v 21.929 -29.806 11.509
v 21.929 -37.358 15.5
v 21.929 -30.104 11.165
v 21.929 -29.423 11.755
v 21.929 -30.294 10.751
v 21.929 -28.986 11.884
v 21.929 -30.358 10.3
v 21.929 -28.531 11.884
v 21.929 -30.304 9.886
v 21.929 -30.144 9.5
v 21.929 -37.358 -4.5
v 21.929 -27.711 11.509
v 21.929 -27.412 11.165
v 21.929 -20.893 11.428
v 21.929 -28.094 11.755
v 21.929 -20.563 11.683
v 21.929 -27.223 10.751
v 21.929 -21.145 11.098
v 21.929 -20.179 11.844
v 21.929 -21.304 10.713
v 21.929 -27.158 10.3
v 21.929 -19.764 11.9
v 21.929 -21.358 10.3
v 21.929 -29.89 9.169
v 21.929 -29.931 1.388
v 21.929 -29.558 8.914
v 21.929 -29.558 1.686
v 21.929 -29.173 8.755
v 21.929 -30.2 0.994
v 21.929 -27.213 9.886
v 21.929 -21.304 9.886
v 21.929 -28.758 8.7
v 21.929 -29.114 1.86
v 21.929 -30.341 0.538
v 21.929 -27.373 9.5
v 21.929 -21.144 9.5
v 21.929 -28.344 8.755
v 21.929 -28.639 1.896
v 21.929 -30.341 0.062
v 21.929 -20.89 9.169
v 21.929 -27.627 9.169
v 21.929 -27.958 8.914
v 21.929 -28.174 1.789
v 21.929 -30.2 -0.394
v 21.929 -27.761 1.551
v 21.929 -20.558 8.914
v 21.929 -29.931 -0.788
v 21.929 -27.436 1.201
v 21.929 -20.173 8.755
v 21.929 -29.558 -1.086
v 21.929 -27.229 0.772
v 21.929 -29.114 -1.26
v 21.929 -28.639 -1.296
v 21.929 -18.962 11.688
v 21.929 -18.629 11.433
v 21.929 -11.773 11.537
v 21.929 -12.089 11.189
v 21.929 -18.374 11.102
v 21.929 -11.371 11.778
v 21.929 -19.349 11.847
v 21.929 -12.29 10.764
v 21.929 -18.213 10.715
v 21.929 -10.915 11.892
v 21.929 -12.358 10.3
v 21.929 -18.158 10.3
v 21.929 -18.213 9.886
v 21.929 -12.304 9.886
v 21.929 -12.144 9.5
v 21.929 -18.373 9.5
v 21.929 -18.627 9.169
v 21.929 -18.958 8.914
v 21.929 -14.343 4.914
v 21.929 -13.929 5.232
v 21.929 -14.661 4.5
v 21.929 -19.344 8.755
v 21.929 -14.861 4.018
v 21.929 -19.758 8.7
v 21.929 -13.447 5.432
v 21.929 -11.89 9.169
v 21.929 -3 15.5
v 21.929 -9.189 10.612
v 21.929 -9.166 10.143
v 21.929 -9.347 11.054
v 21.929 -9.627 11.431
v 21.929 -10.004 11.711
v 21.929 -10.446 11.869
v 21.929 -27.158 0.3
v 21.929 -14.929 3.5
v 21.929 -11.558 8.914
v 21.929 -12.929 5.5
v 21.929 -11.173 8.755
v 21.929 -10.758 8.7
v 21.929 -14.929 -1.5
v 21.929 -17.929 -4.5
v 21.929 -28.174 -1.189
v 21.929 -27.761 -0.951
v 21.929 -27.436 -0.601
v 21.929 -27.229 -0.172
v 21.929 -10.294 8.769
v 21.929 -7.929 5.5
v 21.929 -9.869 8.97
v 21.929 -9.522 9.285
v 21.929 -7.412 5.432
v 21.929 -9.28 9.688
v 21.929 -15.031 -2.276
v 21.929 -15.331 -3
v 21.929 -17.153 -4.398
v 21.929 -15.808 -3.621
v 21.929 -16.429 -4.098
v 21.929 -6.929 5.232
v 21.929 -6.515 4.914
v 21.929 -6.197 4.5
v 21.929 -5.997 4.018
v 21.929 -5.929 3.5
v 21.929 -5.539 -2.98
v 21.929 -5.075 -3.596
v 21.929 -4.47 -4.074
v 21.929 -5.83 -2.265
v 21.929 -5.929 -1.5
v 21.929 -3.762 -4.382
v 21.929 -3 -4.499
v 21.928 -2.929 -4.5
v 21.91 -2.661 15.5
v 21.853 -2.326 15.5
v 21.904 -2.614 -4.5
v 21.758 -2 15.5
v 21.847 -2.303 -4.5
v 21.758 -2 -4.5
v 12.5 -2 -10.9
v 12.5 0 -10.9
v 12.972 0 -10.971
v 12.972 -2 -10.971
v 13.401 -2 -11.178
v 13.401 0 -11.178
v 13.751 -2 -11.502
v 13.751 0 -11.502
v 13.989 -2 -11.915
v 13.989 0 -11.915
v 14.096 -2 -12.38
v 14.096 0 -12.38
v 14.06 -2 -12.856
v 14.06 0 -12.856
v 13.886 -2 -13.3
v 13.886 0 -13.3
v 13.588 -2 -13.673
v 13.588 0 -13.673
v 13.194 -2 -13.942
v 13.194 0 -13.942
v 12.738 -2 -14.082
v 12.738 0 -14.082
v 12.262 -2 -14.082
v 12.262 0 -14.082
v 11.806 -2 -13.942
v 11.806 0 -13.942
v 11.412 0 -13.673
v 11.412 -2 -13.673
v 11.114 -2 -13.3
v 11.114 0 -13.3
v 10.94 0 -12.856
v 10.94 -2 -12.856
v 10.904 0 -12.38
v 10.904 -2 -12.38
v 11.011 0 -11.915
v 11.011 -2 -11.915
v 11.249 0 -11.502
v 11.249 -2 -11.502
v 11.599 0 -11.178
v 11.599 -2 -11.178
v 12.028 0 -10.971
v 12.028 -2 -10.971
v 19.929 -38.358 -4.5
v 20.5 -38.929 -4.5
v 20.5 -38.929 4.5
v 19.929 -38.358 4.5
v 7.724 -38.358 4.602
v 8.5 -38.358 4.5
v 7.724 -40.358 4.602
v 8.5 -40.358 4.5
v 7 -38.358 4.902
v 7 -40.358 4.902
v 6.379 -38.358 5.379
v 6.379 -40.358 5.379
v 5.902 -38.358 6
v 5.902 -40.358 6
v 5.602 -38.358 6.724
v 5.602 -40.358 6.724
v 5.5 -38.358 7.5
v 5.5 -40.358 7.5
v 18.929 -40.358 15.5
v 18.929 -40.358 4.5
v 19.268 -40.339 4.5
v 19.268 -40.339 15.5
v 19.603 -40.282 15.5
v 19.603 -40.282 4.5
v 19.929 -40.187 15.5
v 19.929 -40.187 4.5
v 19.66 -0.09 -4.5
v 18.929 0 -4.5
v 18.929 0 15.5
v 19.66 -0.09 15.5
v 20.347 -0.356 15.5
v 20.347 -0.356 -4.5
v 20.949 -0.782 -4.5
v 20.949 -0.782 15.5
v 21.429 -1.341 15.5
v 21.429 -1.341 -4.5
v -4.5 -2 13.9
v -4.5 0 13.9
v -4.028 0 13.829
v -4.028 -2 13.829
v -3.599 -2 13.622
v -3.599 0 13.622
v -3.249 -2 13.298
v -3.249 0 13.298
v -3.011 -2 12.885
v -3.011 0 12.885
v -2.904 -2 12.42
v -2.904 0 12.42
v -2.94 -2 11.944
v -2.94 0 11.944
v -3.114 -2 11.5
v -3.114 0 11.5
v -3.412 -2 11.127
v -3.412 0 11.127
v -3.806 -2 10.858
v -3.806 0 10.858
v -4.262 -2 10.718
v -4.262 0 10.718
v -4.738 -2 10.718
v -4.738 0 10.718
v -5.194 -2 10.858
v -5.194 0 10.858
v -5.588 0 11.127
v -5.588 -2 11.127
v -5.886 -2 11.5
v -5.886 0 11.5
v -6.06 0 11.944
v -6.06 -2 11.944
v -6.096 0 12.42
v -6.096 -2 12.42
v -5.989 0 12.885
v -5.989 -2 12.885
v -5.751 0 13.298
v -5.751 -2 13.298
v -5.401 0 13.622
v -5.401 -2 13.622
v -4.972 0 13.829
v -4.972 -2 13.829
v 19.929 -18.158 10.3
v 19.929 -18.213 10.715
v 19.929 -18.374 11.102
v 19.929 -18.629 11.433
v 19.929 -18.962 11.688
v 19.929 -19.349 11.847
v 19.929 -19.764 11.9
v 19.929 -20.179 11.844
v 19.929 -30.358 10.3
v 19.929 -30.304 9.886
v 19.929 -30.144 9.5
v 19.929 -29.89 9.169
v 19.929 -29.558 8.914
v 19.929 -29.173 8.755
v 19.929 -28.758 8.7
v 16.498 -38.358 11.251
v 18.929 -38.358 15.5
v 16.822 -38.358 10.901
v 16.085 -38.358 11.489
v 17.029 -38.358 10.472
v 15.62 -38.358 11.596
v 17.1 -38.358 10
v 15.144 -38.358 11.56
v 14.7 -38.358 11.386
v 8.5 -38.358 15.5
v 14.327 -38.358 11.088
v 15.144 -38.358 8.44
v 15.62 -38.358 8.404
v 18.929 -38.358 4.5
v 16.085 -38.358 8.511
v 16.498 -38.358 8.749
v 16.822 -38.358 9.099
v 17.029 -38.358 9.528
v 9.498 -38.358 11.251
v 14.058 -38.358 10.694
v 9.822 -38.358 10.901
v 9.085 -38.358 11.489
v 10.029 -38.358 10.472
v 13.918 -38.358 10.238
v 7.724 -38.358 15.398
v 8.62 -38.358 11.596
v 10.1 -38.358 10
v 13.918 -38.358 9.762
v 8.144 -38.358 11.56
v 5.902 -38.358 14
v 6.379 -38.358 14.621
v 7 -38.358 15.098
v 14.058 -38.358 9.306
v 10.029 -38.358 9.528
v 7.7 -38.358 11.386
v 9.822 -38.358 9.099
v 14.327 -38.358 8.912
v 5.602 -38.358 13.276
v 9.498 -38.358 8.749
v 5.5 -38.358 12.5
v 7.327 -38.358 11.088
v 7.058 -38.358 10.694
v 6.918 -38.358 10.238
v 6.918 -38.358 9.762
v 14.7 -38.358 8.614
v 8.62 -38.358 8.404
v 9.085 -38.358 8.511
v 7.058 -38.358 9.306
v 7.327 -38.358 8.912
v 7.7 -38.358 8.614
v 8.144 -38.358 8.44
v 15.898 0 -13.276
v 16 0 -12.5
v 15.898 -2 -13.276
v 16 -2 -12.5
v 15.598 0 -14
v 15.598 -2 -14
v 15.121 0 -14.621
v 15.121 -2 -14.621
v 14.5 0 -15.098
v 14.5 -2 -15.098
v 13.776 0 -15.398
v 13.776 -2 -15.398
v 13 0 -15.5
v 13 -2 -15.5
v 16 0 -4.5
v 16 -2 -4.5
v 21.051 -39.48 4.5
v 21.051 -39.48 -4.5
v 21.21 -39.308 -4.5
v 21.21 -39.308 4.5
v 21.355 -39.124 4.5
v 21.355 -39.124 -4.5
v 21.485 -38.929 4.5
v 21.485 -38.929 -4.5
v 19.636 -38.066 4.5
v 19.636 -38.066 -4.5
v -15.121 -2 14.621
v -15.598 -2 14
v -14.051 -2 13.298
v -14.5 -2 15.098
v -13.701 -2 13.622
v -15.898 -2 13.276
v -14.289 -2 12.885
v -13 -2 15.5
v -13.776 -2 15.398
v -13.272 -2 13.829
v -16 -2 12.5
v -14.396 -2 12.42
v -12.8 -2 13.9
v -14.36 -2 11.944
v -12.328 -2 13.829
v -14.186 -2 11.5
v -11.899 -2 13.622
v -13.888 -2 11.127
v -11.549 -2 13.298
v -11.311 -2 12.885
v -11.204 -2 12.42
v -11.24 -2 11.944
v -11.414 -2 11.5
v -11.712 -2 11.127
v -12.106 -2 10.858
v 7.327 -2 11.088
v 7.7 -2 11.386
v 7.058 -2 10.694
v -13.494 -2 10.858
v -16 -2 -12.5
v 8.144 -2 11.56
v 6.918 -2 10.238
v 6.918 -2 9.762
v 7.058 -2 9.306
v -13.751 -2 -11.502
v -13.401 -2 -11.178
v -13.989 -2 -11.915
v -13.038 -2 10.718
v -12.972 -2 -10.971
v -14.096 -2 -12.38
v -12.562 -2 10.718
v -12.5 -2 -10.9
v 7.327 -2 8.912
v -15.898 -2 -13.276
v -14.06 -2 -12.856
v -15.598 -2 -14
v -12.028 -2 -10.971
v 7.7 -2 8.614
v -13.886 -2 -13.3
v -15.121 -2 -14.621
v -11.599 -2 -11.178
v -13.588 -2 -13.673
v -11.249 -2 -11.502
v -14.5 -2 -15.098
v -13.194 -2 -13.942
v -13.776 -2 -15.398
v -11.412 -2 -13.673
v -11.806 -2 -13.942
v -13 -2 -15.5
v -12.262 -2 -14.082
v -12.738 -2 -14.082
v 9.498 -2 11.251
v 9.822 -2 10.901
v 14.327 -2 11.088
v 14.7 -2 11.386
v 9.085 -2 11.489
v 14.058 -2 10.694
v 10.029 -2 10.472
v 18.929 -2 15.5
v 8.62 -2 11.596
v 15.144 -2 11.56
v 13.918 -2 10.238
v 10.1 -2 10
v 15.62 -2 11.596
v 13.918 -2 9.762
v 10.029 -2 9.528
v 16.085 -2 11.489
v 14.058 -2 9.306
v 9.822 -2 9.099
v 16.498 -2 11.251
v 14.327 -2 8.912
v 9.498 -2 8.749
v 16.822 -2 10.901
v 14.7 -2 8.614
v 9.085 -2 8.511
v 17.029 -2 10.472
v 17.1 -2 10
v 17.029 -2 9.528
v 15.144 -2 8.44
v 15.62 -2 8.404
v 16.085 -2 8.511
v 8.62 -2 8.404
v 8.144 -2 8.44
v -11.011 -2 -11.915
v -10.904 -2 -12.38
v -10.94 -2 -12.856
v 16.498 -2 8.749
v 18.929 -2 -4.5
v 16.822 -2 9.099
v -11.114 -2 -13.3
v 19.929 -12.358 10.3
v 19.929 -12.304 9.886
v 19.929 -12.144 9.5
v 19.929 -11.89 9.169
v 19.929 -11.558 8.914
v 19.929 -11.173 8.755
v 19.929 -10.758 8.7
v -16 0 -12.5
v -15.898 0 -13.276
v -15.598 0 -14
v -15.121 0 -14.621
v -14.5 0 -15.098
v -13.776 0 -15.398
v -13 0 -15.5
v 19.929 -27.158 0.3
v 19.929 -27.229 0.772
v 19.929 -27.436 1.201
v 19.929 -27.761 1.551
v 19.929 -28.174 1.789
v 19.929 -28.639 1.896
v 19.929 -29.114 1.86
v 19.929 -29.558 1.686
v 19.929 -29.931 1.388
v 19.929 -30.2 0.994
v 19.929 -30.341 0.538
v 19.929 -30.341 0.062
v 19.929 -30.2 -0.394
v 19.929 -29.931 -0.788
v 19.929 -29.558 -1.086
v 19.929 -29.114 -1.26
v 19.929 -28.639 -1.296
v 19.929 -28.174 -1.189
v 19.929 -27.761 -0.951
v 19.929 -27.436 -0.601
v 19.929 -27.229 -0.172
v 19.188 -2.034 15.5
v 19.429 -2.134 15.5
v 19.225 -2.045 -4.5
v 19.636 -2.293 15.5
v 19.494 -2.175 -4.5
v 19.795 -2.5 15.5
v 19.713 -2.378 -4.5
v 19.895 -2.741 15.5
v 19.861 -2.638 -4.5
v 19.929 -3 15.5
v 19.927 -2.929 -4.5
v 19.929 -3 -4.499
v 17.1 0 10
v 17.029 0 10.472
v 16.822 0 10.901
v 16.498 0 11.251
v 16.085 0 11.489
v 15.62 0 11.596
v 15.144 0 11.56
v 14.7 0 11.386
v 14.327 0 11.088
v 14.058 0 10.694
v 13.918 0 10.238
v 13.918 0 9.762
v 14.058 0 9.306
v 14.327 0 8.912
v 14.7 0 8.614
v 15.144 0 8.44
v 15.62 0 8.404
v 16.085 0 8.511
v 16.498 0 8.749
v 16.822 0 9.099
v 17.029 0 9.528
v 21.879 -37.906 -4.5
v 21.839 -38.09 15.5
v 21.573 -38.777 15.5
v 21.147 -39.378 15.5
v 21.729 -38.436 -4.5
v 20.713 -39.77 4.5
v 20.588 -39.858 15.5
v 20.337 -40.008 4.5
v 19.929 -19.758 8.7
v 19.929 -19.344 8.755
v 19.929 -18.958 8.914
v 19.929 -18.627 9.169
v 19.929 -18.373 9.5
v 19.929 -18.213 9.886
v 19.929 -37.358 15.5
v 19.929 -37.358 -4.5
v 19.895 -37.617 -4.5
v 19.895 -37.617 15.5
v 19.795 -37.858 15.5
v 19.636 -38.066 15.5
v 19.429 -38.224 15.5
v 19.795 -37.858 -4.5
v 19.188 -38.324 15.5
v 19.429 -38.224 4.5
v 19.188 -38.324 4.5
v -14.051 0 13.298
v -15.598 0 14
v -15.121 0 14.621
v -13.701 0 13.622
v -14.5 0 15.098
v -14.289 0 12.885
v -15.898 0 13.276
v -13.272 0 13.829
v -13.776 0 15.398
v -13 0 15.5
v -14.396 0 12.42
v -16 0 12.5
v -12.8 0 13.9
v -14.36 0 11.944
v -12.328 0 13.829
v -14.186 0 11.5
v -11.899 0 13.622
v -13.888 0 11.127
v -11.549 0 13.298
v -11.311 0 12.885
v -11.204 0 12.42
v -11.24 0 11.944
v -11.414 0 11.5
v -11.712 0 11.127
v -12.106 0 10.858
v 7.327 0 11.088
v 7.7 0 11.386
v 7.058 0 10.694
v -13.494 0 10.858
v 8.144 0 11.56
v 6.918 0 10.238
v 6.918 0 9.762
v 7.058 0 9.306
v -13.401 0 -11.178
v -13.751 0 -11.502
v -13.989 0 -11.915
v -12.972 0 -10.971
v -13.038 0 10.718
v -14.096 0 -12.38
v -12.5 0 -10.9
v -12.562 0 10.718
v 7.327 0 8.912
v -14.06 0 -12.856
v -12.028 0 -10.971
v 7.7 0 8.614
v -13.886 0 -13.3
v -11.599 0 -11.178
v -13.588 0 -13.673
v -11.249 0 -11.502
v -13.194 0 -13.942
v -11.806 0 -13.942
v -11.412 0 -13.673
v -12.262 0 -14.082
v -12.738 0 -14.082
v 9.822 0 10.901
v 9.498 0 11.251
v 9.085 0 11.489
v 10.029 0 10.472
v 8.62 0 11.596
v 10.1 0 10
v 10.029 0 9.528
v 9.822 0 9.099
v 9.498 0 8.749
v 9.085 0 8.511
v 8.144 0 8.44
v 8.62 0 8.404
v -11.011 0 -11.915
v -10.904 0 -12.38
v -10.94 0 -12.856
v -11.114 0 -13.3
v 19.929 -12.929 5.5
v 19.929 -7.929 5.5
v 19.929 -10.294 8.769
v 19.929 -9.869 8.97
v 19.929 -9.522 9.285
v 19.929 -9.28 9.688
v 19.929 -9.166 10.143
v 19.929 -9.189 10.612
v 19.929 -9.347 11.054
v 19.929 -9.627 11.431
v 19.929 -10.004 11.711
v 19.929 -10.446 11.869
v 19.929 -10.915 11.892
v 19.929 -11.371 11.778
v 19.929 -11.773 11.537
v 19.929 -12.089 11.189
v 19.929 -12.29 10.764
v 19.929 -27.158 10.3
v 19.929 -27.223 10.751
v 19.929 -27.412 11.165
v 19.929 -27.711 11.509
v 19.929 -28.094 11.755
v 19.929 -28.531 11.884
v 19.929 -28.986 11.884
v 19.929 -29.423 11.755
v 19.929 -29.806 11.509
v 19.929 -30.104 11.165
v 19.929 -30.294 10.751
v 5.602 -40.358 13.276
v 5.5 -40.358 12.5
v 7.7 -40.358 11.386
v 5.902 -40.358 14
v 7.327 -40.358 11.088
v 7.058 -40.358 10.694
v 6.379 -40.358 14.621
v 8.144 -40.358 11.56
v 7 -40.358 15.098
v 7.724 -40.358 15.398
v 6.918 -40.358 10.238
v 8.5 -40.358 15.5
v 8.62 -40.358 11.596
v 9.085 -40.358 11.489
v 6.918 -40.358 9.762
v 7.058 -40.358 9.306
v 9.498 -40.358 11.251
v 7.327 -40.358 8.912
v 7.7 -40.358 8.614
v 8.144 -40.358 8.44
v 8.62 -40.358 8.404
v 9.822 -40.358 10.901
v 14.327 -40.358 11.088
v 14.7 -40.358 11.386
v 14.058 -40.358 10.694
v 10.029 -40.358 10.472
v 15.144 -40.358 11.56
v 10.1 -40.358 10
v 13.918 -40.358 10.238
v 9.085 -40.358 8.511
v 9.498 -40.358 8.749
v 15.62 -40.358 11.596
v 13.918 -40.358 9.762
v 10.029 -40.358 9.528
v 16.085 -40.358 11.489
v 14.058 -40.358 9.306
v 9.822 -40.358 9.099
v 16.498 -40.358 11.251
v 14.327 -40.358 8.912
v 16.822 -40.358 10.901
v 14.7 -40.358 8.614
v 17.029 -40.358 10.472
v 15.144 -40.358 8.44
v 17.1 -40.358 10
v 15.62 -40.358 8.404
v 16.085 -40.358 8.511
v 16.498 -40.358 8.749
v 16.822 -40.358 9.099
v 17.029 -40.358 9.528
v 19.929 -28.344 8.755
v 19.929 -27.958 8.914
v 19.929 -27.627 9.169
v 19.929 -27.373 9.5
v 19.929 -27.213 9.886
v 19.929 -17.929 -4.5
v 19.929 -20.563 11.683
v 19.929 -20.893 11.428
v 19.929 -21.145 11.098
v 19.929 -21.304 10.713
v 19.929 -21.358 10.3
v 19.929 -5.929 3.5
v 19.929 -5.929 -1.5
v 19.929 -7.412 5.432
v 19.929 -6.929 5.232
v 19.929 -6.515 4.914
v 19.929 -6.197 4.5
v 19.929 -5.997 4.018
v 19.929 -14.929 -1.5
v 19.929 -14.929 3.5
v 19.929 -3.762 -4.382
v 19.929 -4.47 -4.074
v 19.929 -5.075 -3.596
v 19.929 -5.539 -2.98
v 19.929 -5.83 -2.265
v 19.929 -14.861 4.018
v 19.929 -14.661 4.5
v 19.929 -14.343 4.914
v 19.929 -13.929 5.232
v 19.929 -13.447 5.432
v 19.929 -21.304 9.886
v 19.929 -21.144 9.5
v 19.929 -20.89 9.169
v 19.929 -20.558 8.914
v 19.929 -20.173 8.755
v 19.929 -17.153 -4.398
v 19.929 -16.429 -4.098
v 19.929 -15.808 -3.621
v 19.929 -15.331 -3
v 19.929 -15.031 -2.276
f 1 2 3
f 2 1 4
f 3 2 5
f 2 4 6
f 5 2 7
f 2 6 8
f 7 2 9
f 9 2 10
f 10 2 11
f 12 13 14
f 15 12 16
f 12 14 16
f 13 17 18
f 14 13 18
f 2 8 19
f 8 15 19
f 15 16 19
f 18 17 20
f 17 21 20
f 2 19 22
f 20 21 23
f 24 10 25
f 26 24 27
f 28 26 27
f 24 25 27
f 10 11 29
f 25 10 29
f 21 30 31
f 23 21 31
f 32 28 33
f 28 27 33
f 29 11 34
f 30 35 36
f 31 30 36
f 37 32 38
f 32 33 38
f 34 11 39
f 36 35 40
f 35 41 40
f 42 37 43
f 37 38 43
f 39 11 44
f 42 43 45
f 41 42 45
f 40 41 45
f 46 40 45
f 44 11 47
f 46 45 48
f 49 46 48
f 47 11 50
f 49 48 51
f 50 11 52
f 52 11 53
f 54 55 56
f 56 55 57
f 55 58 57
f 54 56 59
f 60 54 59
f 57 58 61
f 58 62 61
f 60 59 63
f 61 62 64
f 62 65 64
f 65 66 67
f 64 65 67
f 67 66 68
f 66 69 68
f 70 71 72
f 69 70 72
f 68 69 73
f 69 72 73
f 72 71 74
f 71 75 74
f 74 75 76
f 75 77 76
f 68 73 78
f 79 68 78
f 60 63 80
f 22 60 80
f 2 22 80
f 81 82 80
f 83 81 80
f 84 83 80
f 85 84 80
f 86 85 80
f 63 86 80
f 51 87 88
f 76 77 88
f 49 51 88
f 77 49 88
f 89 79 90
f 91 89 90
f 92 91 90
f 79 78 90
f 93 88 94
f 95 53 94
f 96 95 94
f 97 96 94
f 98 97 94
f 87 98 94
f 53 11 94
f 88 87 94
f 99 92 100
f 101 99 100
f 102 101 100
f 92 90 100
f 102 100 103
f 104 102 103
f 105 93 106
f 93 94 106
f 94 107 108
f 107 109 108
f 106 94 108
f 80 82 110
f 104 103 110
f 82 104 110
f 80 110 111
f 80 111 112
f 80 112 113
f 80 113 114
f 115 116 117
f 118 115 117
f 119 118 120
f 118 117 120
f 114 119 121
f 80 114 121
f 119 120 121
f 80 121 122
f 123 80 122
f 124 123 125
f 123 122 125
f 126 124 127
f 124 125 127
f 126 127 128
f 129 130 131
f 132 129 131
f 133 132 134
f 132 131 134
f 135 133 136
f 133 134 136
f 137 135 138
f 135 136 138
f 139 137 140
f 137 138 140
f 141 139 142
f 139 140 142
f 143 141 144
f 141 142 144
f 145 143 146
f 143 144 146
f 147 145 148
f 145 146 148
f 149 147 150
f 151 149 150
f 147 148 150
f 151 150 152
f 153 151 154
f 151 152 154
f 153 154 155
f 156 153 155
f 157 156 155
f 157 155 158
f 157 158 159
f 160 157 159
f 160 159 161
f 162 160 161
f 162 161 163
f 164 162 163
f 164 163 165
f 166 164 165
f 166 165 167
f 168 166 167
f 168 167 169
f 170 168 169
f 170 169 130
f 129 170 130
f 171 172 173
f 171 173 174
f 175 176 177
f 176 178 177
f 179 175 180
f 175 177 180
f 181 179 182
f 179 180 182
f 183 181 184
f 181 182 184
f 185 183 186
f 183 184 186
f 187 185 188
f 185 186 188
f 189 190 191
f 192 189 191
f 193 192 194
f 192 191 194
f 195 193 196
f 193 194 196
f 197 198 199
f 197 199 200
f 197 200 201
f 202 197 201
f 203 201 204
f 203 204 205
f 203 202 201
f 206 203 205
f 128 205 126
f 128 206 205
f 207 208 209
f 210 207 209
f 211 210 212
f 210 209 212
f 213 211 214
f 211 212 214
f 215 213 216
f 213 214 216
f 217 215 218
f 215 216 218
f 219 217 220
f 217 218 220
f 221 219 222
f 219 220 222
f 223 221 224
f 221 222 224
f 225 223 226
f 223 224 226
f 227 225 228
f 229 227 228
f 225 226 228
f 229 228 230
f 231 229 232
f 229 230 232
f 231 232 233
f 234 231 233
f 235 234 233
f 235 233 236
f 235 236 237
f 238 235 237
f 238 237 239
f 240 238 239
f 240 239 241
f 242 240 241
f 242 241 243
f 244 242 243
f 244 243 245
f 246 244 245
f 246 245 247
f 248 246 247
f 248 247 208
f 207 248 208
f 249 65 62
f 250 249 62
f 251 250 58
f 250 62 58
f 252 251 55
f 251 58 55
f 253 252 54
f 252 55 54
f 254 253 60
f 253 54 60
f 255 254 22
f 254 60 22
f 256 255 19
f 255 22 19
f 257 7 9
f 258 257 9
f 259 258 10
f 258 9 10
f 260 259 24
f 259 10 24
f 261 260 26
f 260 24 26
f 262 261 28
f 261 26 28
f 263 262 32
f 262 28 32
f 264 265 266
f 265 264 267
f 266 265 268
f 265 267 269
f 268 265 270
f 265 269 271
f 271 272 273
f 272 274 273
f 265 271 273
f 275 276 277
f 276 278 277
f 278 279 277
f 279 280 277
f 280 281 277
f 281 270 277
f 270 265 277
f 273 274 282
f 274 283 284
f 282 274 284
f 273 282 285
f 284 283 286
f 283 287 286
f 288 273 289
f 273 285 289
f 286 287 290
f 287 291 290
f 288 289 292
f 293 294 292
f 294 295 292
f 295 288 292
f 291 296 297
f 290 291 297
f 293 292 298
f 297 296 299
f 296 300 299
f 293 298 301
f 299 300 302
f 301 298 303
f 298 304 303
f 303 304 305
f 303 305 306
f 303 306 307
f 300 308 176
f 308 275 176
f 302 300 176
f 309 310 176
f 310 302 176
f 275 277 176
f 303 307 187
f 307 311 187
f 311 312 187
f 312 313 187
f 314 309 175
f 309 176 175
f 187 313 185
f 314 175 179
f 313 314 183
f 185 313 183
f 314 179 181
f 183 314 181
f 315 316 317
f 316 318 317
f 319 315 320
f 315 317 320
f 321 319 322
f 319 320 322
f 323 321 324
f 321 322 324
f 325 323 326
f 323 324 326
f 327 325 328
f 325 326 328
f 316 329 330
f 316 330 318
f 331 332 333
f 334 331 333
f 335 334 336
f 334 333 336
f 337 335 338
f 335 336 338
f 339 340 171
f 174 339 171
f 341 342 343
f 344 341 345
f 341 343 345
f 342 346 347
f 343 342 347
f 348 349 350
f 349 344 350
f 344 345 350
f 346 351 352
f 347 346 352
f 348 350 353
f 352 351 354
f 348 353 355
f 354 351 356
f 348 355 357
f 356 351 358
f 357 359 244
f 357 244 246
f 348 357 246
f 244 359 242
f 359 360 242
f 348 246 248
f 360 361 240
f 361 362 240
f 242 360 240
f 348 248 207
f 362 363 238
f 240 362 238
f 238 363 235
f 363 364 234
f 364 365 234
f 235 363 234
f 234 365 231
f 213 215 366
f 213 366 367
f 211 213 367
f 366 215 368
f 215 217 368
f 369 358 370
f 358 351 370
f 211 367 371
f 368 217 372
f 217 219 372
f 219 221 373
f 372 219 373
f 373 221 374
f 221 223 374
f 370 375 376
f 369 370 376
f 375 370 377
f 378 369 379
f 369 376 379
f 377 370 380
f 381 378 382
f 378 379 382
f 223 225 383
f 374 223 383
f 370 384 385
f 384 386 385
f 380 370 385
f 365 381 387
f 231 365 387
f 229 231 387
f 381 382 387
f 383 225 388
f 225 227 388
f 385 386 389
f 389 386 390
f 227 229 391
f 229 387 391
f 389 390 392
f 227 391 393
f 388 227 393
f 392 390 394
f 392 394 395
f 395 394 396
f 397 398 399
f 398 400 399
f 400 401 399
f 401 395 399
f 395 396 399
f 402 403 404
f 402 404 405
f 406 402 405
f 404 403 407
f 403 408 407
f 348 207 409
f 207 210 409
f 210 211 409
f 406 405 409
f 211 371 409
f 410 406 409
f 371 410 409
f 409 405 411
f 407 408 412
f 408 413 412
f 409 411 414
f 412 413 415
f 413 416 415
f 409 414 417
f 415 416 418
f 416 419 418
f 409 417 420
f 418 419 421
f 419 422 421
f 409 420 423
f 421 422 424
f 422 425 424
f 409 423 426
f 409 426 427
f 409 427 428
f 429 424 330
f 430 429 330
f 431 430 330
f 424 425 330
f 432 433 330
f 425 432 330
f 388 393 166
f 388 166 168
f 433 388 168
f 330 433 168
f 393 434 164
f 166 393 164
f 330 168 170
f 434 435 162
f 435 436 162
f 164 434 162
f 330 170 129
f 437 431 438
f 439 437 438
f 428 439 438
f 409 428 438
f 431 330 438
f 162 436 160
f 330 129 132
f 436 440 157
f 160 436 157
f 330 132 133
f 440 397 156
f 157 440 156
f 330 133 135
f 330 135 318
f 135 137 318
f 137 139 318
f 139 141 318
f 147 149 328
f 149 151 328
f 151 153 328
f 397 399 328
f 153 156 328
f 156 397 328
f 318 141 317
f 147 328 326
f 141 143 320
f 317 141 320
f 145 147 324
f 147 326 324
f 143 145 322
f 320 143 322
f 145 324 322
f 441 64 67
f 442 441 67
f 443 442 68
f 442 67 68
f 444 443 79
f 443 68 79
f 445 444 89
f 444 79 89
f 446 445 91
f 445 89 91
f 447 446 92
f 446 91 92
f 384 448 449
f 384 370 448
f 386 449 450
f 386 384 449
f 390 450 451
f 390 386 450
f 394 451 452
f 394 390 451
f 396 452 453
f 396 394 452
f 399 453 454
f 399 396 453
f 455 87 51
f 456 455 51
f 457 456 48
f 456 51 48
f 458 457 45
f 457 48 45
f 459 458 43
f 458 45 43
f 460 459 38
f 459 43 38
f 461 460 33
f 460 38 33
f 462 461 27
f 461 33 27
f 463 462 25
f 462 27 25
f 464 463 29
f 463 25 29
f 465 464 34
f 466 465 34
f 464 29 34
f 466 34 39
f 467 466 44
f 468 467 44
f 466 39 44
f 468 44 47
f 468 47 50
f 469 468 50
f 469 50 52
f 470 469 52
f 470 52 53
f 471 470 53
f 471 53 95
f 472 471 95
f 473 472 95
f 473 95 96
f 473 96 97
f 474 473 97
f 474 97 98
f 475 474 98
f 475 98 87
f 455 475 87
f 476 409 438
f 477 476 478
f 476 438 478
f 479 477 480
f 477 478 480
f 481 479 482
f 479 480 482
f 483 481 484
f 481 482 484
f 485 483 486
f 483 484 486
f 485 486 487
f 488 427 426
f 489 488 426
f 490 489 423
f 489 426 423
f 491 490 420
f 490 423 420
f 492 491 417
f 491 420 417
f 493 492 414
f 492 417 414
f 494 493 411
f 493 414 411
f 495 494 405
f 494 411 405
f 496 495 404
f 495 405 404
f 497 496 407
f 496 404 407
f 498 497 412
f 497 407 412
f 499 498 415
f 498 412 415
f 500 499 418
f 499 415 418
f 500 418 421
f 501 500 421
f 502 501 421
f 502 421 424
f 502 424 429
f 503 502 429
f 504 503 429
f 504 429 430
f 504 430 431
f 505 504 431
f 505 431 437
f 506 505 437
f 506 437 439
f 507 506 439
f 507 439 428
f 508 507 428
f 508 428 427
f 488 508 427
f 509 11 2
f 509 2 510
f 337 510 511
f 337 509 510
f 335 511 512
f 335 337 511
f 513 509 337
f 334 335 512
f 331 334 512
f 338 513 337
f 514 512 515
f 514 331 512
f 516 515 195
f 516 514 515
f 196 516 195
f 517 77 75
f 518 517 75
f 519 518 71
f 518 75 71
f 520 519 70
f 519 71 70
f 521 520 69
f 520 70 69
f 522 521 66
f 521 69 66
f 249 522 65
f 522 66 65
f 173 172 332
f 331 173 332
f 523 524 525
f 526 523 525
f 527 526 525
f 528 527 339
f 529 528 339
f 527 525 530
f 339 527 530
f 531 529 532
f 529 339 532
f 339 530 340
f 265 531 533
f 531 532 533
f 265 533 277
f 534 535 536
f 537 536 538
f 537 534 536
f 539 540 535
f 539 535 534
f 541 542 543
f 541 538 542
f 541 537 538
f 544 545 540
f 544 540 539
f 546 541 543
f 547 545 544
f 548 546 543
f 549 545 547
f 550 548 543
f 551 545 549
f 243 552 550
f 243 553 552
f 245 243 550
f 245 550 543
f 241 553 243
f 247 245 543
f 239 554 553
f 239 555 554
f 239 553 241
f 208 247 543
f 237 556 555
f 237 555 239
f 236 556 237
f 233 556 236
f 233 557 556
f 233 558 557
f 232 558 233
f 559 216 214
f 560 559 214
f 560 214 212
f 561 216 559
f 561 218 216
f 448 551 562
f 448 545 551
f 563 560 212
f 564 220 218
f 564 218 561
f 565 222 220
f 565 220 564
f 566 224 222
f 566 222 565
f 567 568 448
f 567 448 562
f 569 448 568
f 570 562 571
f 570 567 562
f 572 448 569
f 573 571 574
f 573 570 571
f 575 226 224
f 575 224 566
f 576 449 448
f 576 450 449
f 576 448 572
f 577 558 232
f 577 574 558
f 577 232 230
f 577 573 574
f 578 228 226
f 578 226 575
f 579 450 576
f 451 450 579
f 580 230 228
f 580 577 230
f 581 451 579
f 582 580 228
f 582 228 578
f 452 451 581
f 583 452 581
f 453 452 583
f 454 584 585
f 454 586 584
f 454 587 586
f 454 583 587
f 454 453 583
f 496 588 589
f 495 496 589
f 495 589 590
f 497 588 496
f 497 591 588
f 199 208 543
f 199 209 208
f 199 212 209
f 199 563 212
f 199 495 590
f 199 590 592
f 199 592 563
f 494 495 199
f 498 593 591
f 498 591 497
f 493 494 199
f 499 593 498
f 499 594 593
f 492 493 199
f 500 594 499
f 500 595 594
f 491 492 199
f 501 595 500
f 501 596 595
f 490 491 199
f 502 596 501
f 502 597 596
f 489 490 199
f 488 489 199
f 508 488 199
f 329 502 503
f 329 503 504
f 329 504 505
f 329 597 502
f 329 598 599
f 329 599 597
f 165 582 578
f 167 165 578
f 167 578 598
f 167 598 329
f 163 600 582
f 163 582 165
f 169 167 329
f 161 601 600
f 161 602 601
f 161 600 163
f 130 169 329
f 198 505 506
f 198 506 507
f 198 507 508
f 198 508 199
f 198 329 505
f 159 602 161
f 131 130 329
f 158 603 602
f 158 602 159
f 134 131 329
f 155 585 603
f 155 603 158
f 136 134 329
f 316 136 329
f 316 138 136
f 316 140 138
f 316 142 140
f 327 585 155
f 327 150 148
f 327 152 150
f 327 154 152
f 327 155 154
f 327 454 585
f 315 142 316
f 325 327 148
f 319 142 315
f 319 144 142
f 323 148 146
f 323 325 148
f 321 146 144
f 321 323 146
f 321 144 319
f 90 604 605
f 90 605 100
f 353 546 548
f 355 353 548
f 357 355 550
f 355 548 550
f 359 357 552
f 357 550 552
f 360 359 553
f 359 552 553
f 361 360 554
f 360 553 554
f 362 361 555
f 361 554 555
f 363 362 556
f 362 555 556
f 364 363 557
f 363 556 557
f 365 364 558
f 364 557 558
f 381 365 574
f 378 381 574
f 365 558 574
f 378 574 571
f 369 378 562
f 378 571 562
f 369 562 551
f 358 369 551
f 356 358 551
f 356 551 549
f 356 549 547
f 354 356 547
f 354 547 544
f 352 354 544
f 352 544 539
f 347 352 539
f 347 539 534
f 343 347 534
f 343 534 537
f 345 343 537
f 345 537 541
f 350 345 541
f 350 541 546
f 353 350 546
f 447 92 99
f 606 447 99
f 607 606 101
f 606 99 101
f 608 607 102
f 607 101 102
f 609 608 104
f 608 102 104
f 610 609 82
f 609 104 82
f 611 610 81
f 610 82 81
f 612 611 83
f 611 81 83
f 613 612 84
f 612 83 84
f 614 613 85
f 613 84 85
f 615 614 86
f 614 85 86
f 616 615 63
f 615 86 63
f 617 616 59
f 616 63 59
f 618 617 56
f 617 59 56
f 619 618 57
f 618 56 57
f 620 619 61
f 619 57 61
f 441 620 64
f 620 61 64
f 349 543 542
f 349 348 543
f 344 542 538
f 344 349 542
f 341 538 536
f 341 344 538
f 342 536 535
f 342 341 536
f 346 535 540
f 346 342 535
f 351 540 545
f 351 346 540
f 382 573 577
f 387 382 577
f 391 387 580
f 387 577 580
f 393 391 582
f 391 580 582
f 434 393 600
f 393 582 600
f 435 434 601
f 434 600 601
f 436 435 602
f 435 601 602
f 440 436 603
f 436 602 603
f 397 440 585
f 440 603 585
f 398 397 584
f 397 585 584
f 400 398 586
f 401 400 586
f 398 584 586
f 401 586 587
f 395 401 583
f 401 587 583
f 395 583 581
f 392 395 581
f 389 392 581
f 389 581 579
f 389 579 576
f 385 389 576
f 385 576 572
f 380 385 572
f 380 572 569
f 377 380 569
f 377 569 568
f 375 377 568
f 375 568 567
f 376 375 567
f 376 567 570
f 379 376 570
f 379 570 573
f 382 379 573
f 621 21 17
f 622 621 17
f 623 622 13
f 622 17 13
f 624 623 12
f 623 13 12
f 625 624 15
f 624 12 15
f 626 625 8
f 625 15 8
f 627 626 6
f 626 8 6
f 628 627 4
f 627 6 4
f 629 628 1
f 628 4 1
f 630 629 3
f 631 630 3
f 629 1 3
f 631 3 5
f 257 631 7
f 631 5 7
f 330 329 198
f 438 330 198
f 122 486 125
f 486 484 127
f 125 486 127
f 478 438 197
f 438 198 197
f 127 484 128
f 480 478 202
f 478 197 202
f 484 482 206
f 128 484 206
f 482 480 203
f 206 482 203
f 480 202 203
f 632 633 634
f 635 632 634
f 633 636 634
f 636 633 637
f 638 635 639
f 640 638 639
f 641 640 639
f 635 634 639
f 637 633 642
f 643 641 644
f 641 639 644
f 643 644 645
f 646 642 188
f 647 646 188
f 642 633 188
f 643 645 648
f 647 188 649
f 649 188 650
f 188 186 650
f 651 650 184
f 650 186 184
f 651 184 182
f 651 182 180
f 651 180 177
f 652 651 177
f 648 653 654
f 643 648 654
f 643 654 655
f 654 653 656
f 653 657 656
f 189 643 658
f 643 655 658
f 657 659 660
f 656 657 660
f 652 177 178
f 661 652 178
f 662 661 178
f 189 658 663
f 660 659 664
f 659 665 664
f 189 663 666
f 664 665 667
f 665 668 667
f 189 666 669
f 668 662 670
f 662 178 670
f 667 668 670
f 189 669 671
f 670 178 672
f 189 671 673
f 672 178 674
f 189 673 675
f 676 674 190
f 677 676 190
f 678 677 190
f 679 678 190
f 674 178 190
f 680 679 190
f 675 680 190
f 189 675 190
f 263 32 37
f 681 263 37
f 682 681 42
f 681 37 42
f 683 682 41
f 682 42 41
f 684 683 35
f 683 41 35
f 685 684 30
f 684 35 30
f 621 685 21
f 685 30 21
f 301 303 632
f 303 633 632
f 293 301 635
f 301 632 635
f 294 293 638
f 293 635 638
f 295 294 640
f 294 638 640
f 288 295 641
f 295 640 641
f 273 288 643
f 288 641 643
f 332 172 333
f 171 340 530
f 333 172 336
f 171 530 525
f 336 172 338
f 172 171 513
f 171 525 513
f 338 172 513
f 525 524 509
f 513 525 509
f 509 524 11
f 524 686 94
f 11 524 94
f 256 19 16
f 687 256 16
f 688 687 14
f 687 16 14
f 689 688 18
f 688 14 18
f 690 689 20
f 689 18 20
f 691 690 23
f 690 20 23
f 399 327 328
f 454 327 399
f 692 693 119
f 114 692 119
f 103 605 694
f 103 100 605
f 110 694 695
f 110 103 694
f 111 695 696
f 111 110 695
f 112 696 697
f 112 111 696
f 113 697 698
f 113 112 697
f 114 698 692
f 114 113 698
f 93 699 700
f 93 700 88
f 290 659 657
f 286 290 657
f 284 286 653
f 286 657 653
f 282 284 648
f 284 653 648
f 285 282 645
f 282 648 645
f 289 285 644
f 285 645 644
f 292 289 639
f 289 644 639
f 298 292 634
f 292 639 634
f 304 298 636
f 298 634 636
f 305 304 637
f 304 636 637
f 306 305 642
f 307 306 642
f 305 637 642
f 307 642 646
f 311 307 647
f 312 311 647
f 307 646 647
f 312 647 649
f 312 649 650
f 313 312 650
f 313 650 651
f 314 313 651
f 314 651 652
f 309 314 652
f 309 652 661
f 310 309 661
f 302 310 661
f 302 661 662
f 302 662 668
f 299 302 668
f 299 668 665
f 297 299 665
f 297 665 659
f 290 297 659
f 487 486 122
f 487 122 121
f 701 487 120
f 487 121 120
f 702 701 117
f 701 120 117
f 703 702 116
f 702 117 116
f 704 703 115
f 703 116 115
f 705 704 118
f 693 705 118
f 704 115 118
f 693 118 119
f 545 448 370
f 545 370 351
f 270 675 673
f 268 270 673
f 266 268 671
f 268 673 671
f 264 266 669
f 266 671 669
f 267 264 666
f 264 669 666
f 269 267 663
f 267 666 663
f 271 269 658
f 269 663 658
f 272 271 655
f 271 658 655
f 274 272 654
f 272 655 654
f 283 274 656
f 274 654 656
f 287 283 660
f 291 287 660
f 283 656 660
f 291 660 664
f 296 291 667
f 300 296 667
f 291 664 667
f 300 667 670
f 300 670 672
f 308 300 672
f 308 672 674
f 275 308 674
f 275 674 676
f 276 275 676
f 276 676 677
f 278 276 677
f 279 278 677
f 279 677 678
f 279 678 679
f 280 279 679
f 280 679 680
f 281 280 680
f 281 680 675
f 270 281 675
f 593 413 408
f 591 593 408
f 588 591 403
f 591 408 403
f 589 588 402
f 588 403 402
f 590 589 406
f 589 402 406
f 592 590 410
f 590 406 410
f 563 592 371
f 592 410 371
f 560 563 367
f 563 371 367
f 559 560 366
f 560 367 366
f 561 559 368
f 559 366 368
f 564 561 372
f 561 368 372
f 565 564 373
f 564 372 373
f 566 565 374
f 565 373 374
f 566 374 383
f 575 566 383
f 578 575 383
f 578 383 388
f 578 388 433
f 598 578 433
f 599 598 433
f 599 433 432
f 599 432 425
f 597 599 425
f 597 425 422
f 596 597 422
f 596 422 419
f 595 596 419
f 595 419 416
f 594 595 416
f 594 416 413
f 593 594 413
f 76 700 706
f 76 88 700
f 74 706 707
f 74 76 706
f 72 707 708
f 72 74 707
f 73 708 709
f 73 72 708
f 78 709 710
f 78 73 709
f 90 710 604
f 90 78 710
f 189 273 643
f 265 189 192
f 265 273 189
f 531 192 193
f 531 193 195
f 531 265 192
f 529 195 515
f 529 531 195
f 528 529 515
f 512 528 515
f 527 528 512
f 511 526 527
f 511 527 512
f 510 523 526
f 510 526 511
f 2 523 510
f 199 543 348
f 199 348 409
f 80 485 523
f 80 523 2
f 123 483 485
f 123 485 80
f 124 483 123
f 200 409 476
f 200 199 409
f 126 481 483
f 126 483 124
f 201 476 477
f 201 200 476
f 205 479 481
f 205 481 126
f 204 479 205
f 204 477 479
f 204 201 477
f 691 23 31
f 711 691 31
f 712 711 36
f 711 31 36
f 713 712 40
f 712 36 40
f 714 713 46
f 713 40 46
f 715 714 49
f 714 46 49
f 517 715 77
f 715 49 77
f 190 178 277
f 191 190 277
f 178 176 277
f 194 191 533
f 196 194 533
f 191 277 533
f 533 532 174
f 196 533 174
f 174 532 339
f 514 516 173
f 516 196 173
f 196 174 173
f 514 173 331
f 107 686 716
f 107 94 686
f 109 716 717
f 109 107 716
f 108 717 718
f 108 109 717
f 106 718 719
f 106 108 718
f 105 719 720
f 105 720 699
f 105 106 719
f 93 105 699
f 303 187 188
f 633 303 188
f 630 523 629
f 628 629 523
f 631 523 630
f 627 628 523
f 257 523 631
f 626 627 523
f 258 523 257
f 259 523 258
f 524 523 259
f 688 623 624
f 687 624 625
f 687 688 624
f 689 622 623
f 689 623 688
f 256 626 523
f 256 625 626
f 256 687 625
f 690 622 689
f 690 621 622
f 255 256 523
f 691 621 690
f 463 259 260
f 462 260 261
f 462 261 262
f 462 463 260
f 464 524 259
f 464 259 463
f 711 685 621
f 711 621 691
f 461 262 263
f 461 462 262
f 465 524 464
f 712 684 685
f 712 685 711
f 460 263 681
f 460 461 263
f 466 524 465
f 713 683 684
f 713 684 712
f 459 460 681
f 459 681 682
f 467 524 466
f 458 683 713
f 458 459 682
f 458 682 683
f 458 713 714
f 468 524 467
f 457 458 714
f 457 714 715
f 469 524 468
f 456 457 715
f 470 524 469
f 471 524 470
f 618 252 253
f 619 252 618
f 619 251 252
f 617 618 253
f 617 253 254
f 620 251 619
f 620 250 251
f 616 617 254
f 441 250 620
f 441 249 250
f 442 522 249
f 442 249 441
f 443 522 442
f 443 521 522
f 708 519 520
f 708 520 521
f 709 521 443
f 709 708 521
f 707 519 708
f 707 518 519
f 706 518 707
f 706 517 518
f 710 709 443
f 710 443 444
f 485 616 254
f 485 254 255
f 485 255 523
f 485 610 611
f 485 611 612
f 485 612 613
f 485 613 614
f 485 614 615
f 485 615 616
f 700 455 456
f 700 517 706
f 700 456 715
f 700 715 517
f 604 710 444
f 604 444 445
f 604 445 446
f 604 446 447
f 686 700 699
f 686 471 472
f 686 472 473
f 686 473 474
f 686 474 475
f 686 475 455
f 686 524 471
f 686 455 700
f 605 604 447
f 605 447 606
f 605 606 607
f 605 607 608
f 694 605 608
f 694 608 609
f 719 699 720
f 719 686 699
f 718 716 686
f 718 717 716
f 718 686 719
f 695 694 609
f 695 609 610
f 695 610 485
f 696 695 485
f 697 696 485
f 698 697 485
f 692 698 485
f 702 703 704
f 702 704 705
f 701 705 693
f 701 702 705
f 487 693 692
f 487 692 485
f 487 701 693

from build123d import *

# Parameters (mm, degrees)
SM_BASE_FLANGE_1_DEPTH = 2
OTHER_START            = -4.5
OTHER_3_DEPTH          = 20
OTHER_3_2_OUTLINE_W    = 2
OTHER_3_2_OUTLINE_H    = 24
OTHER_3_2_DEPTH        = 20
OTHER_START_2          = 5.5
OTHER_3_3_OUTLINE_W    = 2
OTHER_3_3_OUTLINE_H    = 15
OTHER_3_3_OUTLINE_H_2  = 9
OTHER_3_3_DEPTH        = 10
OTHER_START_3          = 4.5
OTHER_3_4_OUTLINE_W    = 2
OTHER_3_4_OUTLINE_H    = 15
OTHER_3_4_DEPTH        = 1
OTHER_4_DEPTH          = 20
OTHER_4_2_DEPTH        = 9
OTHER_4_3_DEPTH        = 11
OTHER_4_4_DEPTH        = 9
SKETCH_10_R            = 1.6
CUT_EXTRUDE_1_DEPTH    = 10
SKETCH_11_R            = 1.6
CUT_EXTRUDE_2_DEPTH    = 10
SKETCH_13_R            = 1.6
CUT_EXTRUDE_3_DEPTH    = 87
CUT_EXTRUDE_4_DEPTH    = 87
SKETCH_15_R            = 1.6
CUT_EXTRUDE_5_DEPTH    = 87
FILLET_1_R             = 3
FILLET_2_R             = 2


# Read off the part's stored shape, not the designer's step: 绘制的折弯3, 绘制的折弯4
# Sheet-metal steps are written as plain solids
with BuildPart() as part:
    # Sketch 1 → 基体-法兰1 (new body)
    with BuildSketch(Plane(origin=(0, 0, 0), x_dir=(1, 0, 0), z_dir=(0, 1, 0))):
        Polygon((-16, -15.5), (16, -15.5), (73, -15.5), (73, -4.5), (58, -4.5), (58, 4.5), (34, 4.5), (34, -5.5), (25, -5.5), (25, 4.5), (16, 4.5), (16, 15.5), (-16, 15.5), align=None)
    extrude(amount=-SM_BASE_FLANGE_1_DEPTH)

    # Other 3 outline → Other 3 (cut)
    with BuildSketch(Plane.XY.offset(OTHER_START)):
        with BuildLine():
            ThreePointArc((18.929203673, 0), (20.661254481, -0.550510257), (21.757630798, -2))
            Line((21.757630798, -2), (73, -2))
            Line((73, -2), (73, 0))
            Line((73, 0), (18.929203673, 0))
        make_face()
    extrude(amount=OTHER_3_DEPTH, mode=Mode.SUBTRACT)

    # Other 3 2 outline → Other 3 2 (add)
    with BuildSketch(Plane.XY.offset(OTHER_START)):
        with Locations((20.929203673, -26.929203673)):
            Rectangle(OTHER_3_2_OUTLINE_W, OTHER_3_2_OUTLINE_H)
        with BuildLine():
            Line((19.929203673, -3), (19.929203673, -5.929203673))
            Line((19.929203673, -5.929203673), (21.929203673, -5.929203673))
            Line((21.929203673, -5.929203673), (21.929203673, -3))
            ThreePointArc((21.929203673, -3), (21.885999352, -2.492694064), (21.757630798, -2))
            Line((21.757630798, -2), (18.929203673, -2))
            ThreePointArc((18.929203673, -2), (19.636310454, -2.292893219), (19.929203673, -3))
        make_face()
    extrude(amount=OTHER_3_2_DEPTH)

    # Other 3 3 outline → Other 3 3 (add)
    with BuildSketch(Plane.XY.offset(OTHER_START_2)):
        with Locations((20.929203673, -46.429203673)):
            Rectangle(OTHER_3_3_OUTLINE_W, OTHER_3_3_OUTLINE_H)
        with Locations((20.929203673, -10.429203673)):
            Rectangle(OTHER_3_3_OUTLINE_W, OTHER_3_3_OUTLINE_H_2)
    extrude(amount=OTHER_3_3_DEPTH)

    # Other 3 4 outline → Other 3 4 (add)
    with BuildSketch(Plane.XY.offset(OTHER_START_3)):
        with Locations((20.929203673, -46.429203673)):
            Rectangle(OTHER_3_4_OUTLINE_W, OTHER_3_4_OUTLINE_H)
    extrude(amount=OTHER_3_4_DEPTH)

    # Other 4 outline → Other 4 (cut)
    with BuildSketch(Plane.XY.offset(OTHER_START)):
        with BuildLine():
            Line((19.929203673, -40.186834471), (19.929203673, -53.929203673))
            Line((19.929203673, -53.929203673), (21.929203673, -53.929203673))
            Line((21.929203673, -53.929203673), (21.929203673, -37.358407346))
            ThreePointArc((21.929203673, -37.358407346), (21.378693416, -39.090458154), (19.929203673, -40.186834471))
        make_face()
    extrude(amount=OTHER_4_DEPTH, mode=Mode.SUBTRACT)

    # Other 4 2 outline → Other 4 2 (cut)
    with BuildSketch(Plane.XY.offset(OTHER_START)):
        Polygon((19.929203673, -38.929203673), (20.5, -38.929203673), (19.929203673, -38.358407347), align=None)
    extrude(amount=OTHER_4_2_DEPTH, mode=Mode.SUBTRACT)

    # Other 4 3 outline → Other 4 3 (add)
    with BuildSketch(Plane.XY.offset(OTHER_START_3)):
        with BuildLine():
            ThreePointArc((18.929203673, -40.358407346), (19.436509609, -40.315203025), (19.929203673, -40.186834471))
            Line((19.929203673, -40.186834471), (19.929203673, -37.358407346))
            ThreePointArc((19.929203673, -37.358407346), (19.636310454, -38.065514128), (18.929203673, -38.358407346))
            Line((18.929203673, -38.358407346), (5.5, -38.358407346))
            Line((5.5, -38.358407346), (5.5, -40.358407346))
            Line((5.5, -40.358407346), (18.929203673, -40.358407346))
        make_face()
    extrude(amount=OTHER_4_3_DEPTH)

    # Other 4 4 outline → Other 4 4 (add)
    with BuildSketch(Plane.XY.offset(OTHER_START)):
        with BuildLine():
            Line((20.5, -38.929203673), (21.050524017, -39.47972769))
            ThreePointArc((21.050524017, -39.47972769), (21.283955222, -39.217209419), (21.485098605, -38.929203673))
            Line((21.485098605, -38.929203673), (20.5, -38.929203673))
        make_face()
        with BuildLine():
            Line((19.636310454, -38.065514128), (19.929203673, -38.358407347))
            Line((19.929203673, -38.358407347), (19.929203673, -37.358407346))
            ThreePointArc((19.929203673, -37.358407346), (19.853083206, -37.741090779), (19.636310454, -38.065514128))
        make_face()
    extrude(amount=OTHER_4_4_DEPTH)

    # 草图10 → 切除-拉伸1 (cut)
    with BuildSketch(Plane(origin=(0, 0, 0), x_dir=(1, 0, 0), z_dir=(0, 1, 0))):
        with Locations(Location((-12.5, 12.5, 0), (0, 0, 270))):
            Circle(SKETCH_10_R)
        with Locations(Location((12.5, 12.5, 0), (0, 0, 270))):
            Circle(SKETCH_10_R)
    extrude(amount=-CUT_EXTRUDE_1_DEPTH, mode=Mode.SUBTRACT)

    # 草图11 → 切除-拉伸2 (cut)
    with BuildSketch(Plane(origin=(0, 0, 0), x_dir=(1, 0, 0), z_dir=(0, 1, 0))):
        with Locations(Location((-12.8, -12.3, 0), (0, 0, 270))):
            Circle(SKETCH_11_R)
        with Locations(Location((-4.5, -12.3, 0), (0, 0, 270))):
            Circle(SKETCH_11_R)
    extrude(amount=-CUT_EXTRUDE_2_DEPTH, mode=Mode.SUBTRACT)

    # 草图13 → 切除-拉伸3 (cut)
    with BuildSketch(Plane(origin=(0, -40.358407346, 0), x_dir=(-1, 0, 0), z_dir=(0, -1, 0))):
        with Locations(Location((-8.5, -10, 0), (0, 0, 180))):
            Circle(SKETCH_13_R)
        with Locations(Location((-15.5, -10, 0), (0, 0, 180))):
            Circle(SKETCH_13_R)
    extrude(amount=-CUT_EXTRUDE_3_DEPTH, mode=Mode.SUBTRACT)

    # 草图14 → 切除-拉伸4 (cut)
    with BuildSketch(Plane(origin=(21.929203673, 0, 0), x_dir=(0, 0, -1), z_dir=(1, 0, 0))):
        with BuildLine():
            Line((-10.3, -19.758407346), (-10.3, -20.179203673))
            Line((-10.3, -20.179203673), (-10.3, -21.358407346))
            ThreePointArc((-10.3, -21.358407346), (-9.16862915, -20.889778196), (-8.7, -19.758407346))
            ThreePointArc((-8.7, -19.758407346), (-9.16862915, -18.627036497), (-10.3, -18.158407346))
            Line((-10.3, -18.158407346), (-10.3, -19.758407346))
        make_face()
        with BuildLine():
            ThreePointArc((-10.3, -18.158407346), (-11.571470433, -18.78713862), (-11.843674335, -20.179203673))
            Line((-11.843674335, -20.179203673), (-10.3, -20.179203673))
            Line((-10.3, -20.179203673), (-10.3, -19.758407346))
            Line((-10.3, -19.758407346), (-10.3, -18.158407346))
        make_face()
        with BuildLine():
            Line((-10.3, -20.179203673), (-11.843674335, -20.179203673))
            ThreePointArc((-11.843674335, -20.179203673), (-11.271268726, -21.029877779), (-10.3, -21.358407346))
            Line((-10.3, -21.358407346), (-10.3, -20.179203673))
        make_face()
        with BuildLine():
            ThreePointArc((-8.7, -28.758407346), (-9.16862915, -27.627036497), (-10.3, -27.158407346))
            Line((-10.3, -27.158407346), (-10.3, -28.758407346))
            Line((-10.3, -28.758407346), (-10.3, -30.358407346))
            ThreePointArc((-10.3, -30.358407346), (-9.16862915, -29.889778196), (-8.7, -28.758407346))
        make_face()
        with BuildLine():
            Line((-10.3, -28.758407346), (-10.3, -27.158407346))
            ThreePointArc((-10.3, -27.158407346), (-11.9, -28.758407346), (-10.3, -30.358407346))
            Line((-10.3, -30.358407346), (-10.3, -28.758407346))
        make_face()
        with BuildLine():
            ThreePointArc((-8.7, -10.758407346), (-11.43137085, -9.627036497), (-10.3, -12.358407346))
            ThreePointArc((-10.3, -12.358407346), (-9.16862915, -11.889778196), (-8.7, -10.758407346))
        make_face()
    extrude(amount=-CUT_EXTRUDE_4_DEPTH, mode=Mode.SUBTRACT)

    # 草图15 → 切除-拉伸5 (cut)
    with BuildSketch(Plane(origin=(21.929203673, 0, 0), x_dir=(0, 0, -1), z_dir=(1, 0, 0))):
        with Locations(Location((-0.3, -28.758407346, 0), (0, 0, 90))):
            Circle(SKETCH_15_R)
    extrude(amount=-CUT_EXTRUDE_5_DEPTH, mode=Mode.SUBTRACT)

    # 圆角1
    fillet_1_edges = [part.edges().sort_by_distance(p)[0] for p in [
        (5.5, -39.358407346, 4.5),
        (5.5, -39.358407346, 15.5),
        (20.929203673, -5.929203673, -4.5),
        (20.929203673, -14.929203673, -4.5),
        (16, -1, -15.5),
        (-16, -1, -15.5),
        (-16, -1, 15.5),
    ]]
    fillet(fillet_1_edges, radius=FILLET_1_R)

    # 圆角2
    fillet_2_edges = [part.edges().sort_by_distance(p)[0] for p in [
        (20.929203673, -5.929203673, 5.5),
        (20.929203673, -14.929203673, 5.5),
    ]]
    fillet(fillet_2_edges, radius=FILLET_2_R)


solid = part.part
